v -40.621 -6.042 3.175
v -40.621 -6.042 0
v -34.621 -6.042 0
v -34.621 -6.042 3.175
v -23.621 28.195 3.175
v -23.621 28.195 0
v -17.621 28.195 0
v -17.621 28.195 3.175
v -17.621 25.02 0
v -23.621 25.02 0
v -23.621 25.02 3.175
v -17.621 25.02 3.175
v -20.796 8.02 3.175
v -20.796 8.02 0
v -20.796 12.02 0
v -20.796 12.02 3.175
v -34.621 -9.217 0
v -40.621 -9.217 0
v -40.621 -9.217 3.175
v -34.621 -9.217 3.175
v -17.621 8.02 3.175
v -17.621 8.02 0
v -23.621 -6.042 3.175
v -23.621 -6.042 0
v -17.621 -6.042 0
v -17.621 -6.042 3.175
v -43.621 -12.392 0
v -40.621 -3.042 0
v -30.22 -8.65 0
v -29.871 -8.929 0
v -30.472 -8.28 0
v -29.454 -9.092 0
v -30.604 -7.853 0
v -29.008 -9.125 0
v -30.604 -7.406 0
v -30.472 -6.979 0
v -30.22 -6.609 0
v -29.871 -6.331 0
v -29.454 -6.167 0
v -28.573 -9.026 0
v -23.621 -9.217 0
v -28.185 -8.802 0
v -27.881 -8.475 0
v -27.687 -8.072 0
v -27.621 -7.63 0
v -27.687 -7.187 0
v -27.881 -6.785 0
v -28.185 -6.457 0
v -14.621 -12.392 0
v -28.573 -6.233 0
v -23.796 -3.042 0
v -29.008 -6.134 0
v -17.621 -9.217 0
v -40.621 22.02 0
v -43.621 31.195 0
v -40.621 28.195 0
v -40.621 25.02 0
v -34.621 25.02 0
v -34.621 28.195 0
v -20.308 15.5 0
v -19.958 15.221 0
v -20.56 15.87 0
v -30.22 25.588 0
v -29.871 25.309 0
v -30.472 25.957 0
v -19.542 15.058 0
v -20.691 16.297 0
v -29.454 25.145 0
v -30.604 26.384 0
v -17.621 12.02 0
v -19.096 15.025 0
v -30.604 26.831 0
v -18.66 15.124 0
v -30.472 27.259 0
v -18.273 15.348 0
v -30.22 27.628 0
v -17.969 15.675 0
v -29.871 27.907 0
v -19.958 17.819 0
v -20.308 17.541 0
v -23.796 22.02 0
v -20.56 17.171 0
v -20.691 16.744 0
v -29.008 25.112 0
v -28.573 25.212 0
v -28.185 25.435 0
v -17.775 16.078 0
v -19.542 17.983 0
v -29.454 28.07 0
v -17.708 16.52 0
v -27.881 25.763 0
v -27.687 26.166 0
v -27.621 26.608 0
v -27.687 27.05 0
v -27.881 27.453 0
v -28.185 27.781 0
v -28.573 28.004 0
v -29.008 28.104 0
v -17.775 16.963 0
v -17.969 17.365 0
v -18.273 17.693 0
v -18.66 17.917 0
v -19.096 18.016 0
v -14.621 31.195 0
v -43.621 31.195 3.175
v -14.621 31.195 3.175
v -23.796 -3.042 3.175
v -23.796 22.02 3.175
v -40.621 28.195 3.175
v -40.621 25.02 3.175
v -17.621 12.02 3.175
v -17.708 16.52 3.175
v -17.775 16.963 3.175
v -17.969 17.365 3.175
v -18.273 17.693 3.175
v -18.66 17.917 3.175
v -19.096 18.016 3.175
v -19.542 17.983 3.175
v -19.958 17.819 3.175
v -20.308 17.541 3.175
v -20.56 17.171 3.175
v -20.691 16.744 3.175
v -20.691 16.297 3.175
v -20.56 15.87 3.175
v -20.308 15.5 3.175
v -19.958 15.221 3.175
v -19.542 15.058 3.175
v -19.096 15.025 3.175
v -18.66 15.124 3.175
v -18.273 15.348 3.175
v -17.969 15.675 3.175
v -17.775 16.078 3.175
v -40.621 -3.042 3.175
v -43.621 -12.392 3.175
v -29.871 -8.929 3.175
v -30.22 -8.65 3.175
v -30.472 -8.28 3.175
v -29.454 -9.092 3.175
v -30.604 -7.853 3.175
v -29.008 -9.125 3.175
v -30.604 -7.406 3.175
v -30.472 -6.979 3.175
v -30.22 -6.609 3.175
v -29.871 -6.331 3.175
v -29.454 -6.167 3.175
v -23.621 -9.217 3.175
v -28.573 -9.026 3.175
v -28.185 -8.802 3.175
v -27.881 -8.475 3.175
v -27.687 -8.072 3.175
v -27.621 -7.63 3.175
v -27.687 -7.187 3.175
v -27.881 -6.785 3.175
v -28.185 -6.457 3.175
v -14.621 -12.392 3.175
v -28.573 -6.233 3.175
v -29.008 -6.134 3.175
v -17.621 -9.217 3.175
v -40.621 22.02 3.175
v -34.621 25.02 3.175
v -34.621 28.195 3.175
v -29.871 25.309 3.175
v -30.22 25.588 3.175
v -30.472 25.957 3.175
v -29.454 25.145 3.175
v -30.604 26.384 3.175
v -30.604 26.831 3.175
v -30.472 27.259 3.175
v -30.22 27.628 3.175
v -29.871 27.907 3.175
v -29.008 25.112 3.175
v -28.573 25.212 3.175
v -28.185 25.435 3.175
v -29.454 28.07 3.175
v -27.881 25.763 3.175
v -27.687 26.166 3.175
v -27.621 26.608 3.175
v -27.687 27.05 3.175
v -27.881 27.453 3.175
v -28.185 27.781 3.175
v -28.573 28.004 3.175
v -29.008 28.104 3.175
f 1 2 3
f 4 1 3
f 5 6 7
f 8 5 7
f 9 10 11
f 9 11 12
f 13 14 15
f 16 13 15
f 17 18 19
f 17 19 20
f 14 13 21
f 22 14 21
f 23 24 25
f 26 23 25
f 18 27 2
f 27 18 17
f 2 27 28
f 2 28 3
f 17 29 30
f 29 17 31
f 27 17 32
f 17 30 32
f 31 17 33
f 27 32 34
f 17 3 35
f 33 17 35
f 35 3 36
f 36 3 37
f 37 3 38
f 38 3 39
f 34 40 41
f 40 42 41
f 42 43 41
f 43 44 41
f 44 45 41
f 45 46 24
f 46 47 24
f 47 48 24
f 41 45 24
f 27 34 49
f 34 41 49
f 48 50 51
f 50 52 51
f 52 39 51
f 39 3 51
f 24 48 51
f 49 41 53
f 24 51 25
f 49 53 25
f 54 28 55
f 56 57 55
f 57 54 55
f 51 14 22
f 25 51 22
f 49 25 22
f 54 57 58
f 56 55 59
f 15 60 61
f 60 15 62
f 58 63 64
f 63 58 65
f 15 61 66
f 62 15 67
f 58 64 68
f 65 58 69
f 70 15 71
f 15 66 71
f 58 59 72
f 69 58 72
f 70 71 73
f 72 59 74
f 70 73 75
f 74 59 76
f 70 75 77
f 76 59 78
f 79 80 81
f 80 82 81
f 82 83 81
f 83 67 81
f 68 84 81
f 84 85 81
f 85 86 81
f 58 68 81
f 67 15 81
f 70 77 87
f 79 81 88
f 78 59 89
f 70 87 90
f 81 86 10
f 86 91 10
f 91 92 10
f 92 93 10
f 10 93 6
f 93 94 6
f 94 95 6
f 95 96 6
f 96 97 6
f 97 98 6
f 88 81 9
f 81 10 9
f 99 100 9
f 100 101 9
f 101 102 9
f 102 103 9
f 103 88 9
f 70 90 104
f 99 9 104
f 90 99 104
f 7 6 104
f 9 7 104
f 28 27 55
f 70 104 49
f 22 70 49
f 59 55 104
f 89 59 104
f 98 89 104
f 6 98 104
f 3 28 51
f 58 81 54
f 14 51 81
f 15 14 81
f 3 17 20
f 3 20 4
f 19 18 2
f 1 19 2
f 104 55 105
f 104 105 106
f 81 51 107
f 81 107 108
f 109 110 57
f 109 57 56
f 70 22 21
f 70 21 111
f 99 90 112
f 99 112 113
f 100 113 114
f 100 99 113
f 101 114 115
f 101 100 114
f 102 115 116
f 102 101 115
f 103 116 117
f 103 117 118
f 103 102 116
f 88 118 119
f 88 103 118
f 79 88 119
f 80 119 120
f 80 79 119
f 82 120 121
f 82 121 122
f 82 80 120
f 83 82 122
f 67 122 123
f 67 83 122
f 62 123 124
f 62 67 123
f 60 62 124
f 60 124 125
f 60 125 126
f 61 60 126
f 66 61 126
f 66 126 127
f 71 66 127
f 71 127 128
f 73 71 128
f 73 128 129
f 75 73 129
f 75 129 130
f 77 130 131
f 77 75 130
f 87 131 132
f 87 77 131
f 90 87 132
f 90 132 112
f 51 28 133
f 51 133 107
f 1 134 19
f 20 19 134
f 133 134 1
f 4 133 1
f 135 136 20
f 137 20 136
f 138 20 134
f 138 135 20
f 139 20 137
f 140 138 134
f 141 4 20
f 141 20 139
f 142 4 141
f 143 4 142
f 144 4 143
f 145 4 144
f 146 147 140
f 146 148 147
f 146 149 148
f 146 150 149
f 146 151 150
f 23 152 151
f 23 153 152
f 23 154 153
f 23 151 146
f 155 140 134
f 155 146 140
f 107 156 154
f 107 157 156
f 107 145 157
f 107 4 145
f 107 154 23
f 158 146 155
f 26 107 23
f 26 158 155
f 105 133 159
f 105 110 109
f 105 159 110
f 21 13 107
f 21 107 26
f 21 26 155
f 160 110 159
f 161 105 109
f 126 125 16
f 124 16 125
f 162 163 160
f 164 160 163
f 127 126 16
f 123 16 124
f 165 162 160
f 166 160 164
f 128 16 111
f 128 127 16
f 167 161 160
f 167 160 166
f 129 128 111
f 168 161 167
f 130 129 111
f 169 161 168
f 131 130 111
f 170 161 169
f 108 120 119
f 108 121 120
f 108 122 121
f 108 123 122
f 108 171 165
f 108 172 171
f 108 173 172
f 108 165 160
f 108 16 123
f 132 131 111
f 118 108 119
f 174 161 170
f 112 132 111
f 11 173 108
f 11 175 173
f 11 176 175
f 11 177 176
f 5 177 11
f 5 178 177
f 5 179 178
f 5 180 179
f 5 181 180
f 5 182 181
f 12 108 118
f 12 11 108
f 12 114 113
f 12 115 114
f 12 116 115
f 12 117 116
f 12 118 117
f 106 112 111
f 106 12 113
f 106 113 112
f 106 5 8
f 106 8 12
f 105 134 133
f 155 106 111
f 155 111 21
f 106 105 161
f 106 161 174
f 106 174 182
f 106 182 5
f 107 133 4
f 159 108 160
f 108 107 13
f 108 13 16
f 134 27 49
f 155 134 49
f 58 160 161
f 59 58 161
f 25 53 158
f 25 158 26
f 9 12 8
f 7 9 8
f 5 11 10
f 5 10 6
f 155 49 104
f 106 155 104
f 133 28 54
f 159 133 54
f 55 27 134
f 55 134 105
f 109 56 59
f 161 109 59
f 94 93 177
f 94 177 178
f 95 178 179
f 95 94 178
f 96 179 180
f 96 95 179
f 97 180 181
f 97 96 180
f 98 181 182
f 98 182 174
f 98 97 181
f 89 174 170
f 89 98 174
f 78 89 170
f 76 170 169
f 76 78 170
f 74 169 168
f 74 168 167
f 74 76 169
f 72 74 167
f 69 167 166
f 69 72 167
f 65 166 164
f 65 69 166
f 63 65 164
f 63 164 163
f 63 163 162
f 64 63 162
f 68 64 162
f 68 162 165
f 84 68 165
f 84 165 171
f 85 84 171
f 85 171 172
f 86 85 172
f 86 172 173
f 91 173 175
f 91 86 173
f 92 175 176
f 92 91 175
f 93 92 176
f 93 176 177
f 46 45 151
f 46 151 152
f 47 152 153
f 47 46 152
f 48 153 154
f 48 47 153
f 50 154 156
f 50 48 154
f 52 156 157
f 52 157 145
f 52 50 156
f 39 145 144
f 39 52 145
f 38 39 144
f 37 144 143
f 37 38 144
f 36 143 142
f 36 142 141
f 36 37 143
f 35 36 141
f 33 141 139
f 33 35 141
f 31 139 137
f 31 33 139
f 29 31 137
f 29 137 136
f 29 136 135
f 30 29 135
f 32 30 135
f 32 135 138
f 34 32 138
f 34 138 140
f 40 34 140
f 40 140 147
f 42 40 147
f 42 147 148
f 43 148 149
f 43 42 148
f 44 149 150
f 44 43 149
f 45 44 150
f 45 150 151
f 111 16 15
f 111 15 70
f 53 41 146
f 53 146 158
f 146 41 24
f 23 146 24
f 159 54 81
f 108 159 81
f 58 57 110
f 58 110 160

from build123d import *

# Parameters (mm, degrees)
F0_W     = 29
F0_H     = 43.5875
F0_W_2   = 6
F0_H_2   = 3.175
F0_R     = 1.5
F0_W_3   = 16.825
F0_H_3   = 25.0625
F0_W_4   = 3.175
F0_H_4   = 4
F1_DEPTH = 3.175


# Not quite as in the source:
# - a length typed as a fraction of an inch, garbled in the dataset ("3 / 203.2 mm" for 3/8 in), is restored


with BuildPart() as f1:
    # F0 (on Top) → F1 (new body)
    with BuildSketch(Plane.XY):
        with Locations((-29.1205597607, 9.4016398251)):
            Rectangle(F0_W, F0_H)
        with Locations((-37.6205597607, -7.6296101749)):
            Rectangle(F0_W_2, F0_H_2, mode=Mode.SUBTRACT)
        with Locations((-29.1205597607, -7.6296101749)):
            Circle(F0_R, mode=Mode.SUBTRACT)
        with Locations((-20.6205597607, -7.6296101749)):
            Rectangle(F0_W_2, F0_H_2, mode=Mode.SUBTRACT)
        with Locations((-32.2080597607, 9.4891398251)):
            Rectangle(F0_W_3, F0_H_3, mode=Mode.SUBTRACT)
        with Locations((-37.6205597607, 26.6078898251)):
            Rectangle(F0_W_2, F0_H_2, mode=Mode.SUBTRACT)
        with Locations((-19.2080597607, 10.0203898251)):
            Rectangle(F0_W_4, F0_H_4, mode=Mode.SUBTRACT)
        with Locations((-19.2080597607, 16.5203898251)):
            Circle(F0_R, mode=Mode.SUBTRACT)
        with Locations((-29.1205597607, 26.6078898251)):
            Circle(F0_R, mode=Mode.SUBTRACT)
        with Locations((-20.6205597607, 26.6078898251)):
            Rectangle(F0_W_2, F0_H_2, mode=Mode.SUBTRACT)
    extrude(amount=F1_DEPTH)


solid = f1.part
